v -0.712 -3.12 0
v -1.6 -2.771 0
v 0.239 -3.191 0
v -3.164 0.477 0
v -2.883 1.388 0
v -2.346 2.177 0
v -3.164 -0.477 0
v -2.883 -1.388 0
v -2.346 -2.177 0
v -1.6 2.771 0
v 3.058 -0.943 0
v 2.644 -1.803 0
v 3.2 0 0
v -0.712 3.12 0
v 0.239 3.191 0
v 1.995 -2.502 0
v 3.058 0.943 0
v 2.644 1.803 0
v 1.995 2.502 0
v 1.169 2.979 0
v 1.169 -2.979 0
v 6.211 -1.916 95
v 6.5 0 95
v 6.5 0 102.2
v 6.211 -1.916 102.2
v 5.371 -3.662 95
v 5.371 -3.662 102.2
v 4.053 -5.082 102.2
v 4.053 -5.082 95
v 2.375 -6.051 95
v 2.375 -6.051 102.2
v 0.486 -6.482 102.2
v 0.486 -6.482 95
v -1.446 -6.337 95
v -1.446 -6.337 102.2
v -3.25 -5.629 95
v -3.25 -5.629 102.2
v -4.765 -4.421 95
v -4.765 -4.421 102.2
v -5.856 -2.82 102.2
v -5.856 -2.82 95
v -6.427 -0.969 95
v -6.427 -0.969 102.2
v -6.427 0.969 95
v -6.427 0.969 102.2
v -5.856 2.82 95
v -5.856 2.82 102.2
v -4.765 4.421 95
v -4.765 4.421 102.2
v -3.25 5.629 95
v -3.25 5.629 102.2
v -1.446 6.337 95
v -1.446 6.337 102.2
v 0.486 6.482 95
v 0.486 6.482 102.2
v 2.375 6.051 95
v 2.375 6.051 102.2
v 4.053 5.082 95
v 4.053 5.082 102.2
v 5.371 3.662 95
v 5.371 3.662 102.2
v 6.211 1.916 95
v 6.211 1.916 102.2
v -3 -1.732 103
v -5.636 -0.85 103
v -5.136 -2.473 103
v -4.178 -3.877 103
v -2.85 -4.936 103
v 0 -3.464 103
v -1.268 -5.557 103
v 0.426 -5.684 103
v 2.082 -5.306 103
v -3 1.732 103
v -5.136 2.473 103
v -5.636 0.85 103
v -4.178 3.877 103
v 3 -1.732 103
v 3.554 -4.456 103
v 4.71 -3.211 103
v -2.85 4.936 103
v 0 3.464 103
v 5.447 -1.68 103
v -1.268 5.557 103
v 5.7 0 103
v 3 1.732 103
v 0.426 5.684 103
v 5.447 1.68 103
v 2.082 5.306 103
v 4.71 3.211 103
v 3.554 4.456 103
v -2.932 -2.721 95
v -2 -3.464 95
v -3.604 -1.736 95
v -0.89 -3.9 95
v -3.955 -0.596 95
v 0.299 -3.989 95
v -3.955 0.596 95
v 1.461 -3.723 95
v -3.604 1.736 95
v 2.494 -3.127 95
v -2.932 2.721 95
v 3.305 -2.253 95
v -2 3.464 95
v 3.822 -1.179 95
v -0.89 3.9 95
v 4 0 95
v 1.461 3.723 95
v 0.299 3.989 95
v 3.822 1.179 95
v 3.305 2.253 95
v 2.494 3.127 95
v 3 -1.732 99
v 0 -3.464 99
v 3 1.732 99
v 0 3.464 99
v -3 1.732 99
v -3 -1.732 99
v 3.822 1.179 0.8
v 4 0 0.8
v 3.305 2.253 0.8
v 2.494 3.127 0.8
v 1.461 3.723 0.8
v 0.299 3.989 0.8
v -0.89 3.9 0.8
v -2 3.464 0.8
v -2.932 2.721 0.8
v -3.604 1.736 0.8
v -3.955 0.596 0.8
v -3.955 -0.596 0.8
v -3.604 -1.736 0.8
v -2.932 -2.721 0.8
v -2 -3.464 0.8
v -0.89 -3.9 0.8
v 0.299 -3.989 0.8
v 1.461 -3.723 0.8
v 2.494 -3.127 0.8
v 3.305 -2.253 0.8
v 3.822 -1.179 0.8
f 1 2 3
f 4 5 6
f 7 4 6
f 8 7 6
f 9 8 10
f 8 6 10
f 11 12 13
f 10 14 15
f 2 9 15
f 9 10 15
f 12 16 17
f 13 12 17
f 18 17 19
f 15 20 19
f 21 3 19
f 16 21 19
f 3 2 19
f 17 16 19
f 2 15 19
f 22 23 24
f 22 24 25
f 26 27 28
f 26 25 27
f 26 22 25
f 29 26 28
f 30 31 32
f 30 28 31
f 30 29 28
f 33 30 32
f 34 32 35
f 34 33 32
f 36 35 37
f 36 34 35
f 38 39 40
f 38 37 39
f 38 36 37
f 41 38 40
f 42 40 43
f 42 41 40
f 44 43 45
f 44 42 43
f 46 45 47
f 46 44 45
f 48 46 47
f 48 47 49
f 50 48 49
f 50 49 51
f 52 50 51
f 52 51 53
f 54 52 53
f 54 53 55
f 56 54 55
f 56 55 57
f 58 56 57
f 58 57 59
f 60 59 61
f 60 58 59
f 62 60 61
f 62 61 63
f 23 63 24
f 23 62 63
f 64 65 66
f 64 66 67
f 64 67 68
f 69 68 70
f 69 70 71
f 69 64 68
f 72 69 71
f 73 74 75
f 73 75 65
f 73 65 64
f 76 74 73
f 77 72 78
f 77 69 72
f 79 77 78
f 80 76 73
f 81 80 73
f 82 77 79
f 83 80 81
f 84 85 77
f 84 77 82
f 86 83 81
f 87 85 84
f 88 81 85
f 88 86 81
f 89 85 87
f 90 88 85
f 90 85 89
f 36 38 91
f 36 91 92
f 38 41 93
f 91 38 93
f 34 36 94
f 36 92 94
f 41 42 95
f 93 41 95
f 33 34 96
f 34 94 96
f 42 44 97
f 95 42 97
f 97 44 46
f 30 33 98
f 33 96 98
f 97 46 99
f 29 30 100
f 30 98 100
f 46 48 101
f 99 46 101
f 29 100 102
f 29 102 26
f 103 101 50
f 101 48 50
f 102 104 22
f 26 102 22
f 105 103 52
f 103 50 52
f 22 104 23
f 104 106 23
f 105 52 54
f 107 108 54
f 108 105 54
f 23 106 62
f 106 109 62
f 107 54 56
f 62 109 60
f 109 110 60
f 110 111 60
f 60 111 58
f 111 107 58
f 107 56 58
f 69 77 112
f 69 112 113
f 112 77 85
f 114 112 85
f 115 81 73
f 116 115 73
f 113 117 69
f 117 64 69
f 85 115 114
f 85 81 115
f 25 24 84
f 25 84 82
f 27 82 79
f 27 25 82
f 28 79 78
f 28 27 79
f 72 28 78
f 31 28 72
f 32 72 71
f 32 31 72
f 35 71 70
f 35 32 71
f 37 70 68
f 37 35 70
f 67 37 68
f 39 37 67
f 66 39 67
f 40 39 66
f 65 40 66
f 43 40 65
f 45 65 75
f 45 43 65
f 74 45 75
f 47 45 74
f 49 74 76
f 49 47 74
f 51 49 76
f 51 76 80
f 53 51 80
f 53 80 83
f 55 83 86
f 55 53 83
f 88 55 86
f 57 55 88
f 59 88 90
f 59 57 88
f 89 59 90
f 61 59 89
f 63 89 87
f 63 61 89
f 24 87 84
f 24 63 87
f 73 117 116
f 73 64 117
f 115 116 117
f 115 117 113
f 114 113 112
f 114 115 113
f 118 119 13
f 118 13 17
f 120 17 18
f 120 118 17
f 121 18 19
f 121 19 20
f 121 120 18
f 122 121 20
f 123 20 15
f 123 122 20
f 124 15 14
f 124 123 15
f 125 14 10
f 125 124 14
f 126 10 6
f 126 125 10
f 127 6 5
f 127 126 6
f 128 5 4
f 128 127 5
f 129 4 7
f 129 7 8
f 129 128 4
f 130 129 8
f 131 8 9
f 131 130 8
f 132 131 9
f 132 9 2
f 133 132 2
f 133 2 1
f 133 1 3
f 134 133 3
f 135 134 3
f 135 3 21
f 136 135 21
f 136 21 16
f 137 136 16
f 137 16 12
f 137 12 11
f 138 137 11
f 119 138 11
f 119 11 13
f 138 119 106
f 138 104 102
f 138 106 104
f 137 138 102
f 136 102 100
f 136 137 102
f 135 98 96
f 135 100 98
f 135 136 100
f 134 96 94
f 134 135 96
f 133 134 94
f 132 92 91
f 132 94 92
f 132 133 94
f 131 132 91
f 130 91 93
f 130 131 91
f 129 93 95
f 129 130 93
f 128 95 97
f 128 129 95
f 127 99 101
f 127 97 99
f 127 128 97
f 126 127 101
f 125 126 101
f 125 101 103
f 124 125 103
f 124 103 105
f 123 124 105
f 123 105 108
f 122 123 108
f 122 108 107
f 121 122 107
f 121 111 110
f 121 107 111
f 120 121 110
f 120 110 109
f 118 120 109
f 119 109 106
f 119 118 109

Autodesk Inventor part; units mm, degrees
ref_plane "YZ Plane" through (0, 0, 0) normal (1, 0, 0) x (0, 1, 0)
ref_plane "XZ Plane" through (0, 0, 0) normal (0, 1, 0) x (-1, 0, 0)
ref_plane "XY Plane" through (0, 0, 0) normal (0, 0, 1) x (1, 0, 0)
sketch "Sketch1" plane through (0, 0, 0) normal (0, 0, 1) x (1, 0, 0)
  circle A0 centre (0, 0) radius 4
  dimension "Diameter" = 8
extrude "Extrusion1" add sketch "Sketch1" along normal blind 95
sketch "Sketch2" plane through (0, 0, 95) normal (0, 0, 1) x (1, 0, 0)
  circle A0 centre (0, 0) radius 4 projected
  circle A1 centre (0, 0) radius 6.5
  dimension "Head_Diameter" = 13
extrude "Extrusion2" add sketch "Sketch2" along normal blind 8 contours A0 | A1
sketch "Sketch3" plane through (0, 0, 103) normal (0, 0, 1) x (1, 0, 0)
  circle A0 centre (0, 0) radius 6.5 projected
  circle A1 centre (0, 0) radius 3.4641 construction
  line L0 (0, 3.4641) -> (3, 1.7321)
  line L1 (3, -1.7321) -> (3, 1.7321)
  line L2 (0, 3.4641) -> (-3, 1.7321)
  line L3 (-3, -1.7321) -> (-3, 1.7321)
  line L4 (-3, -1.7321) -> (0, -3.4641)
  line L5 (3, -1.7321) -> (0, -3.4641)
  dimension "Hex_Width" = 6
extrude "Extrusion3" cut sketch "Sketch3" against normal blind 4 contours L0 L1 L5 L4 L3 L2
thread "Thread1" size "M8x1.25" class "4g6g" standard "ANSI Metric M Profile" length 28
chamfer "Chamfer1" distance 0.8 angle 45 2 edges at (-6.5, 0, 103) (-4, 0, 0)
equation "\"d9\" = ThreadLength"
equation "\"d12\" = Chamfer"
equation "\"ThreadLength\" = 28"
equation "\"Chamfer\" = 0.8"
properties part number "SCREW, SOCKET HD, P, 12.9, M8X1.25X95MM"
